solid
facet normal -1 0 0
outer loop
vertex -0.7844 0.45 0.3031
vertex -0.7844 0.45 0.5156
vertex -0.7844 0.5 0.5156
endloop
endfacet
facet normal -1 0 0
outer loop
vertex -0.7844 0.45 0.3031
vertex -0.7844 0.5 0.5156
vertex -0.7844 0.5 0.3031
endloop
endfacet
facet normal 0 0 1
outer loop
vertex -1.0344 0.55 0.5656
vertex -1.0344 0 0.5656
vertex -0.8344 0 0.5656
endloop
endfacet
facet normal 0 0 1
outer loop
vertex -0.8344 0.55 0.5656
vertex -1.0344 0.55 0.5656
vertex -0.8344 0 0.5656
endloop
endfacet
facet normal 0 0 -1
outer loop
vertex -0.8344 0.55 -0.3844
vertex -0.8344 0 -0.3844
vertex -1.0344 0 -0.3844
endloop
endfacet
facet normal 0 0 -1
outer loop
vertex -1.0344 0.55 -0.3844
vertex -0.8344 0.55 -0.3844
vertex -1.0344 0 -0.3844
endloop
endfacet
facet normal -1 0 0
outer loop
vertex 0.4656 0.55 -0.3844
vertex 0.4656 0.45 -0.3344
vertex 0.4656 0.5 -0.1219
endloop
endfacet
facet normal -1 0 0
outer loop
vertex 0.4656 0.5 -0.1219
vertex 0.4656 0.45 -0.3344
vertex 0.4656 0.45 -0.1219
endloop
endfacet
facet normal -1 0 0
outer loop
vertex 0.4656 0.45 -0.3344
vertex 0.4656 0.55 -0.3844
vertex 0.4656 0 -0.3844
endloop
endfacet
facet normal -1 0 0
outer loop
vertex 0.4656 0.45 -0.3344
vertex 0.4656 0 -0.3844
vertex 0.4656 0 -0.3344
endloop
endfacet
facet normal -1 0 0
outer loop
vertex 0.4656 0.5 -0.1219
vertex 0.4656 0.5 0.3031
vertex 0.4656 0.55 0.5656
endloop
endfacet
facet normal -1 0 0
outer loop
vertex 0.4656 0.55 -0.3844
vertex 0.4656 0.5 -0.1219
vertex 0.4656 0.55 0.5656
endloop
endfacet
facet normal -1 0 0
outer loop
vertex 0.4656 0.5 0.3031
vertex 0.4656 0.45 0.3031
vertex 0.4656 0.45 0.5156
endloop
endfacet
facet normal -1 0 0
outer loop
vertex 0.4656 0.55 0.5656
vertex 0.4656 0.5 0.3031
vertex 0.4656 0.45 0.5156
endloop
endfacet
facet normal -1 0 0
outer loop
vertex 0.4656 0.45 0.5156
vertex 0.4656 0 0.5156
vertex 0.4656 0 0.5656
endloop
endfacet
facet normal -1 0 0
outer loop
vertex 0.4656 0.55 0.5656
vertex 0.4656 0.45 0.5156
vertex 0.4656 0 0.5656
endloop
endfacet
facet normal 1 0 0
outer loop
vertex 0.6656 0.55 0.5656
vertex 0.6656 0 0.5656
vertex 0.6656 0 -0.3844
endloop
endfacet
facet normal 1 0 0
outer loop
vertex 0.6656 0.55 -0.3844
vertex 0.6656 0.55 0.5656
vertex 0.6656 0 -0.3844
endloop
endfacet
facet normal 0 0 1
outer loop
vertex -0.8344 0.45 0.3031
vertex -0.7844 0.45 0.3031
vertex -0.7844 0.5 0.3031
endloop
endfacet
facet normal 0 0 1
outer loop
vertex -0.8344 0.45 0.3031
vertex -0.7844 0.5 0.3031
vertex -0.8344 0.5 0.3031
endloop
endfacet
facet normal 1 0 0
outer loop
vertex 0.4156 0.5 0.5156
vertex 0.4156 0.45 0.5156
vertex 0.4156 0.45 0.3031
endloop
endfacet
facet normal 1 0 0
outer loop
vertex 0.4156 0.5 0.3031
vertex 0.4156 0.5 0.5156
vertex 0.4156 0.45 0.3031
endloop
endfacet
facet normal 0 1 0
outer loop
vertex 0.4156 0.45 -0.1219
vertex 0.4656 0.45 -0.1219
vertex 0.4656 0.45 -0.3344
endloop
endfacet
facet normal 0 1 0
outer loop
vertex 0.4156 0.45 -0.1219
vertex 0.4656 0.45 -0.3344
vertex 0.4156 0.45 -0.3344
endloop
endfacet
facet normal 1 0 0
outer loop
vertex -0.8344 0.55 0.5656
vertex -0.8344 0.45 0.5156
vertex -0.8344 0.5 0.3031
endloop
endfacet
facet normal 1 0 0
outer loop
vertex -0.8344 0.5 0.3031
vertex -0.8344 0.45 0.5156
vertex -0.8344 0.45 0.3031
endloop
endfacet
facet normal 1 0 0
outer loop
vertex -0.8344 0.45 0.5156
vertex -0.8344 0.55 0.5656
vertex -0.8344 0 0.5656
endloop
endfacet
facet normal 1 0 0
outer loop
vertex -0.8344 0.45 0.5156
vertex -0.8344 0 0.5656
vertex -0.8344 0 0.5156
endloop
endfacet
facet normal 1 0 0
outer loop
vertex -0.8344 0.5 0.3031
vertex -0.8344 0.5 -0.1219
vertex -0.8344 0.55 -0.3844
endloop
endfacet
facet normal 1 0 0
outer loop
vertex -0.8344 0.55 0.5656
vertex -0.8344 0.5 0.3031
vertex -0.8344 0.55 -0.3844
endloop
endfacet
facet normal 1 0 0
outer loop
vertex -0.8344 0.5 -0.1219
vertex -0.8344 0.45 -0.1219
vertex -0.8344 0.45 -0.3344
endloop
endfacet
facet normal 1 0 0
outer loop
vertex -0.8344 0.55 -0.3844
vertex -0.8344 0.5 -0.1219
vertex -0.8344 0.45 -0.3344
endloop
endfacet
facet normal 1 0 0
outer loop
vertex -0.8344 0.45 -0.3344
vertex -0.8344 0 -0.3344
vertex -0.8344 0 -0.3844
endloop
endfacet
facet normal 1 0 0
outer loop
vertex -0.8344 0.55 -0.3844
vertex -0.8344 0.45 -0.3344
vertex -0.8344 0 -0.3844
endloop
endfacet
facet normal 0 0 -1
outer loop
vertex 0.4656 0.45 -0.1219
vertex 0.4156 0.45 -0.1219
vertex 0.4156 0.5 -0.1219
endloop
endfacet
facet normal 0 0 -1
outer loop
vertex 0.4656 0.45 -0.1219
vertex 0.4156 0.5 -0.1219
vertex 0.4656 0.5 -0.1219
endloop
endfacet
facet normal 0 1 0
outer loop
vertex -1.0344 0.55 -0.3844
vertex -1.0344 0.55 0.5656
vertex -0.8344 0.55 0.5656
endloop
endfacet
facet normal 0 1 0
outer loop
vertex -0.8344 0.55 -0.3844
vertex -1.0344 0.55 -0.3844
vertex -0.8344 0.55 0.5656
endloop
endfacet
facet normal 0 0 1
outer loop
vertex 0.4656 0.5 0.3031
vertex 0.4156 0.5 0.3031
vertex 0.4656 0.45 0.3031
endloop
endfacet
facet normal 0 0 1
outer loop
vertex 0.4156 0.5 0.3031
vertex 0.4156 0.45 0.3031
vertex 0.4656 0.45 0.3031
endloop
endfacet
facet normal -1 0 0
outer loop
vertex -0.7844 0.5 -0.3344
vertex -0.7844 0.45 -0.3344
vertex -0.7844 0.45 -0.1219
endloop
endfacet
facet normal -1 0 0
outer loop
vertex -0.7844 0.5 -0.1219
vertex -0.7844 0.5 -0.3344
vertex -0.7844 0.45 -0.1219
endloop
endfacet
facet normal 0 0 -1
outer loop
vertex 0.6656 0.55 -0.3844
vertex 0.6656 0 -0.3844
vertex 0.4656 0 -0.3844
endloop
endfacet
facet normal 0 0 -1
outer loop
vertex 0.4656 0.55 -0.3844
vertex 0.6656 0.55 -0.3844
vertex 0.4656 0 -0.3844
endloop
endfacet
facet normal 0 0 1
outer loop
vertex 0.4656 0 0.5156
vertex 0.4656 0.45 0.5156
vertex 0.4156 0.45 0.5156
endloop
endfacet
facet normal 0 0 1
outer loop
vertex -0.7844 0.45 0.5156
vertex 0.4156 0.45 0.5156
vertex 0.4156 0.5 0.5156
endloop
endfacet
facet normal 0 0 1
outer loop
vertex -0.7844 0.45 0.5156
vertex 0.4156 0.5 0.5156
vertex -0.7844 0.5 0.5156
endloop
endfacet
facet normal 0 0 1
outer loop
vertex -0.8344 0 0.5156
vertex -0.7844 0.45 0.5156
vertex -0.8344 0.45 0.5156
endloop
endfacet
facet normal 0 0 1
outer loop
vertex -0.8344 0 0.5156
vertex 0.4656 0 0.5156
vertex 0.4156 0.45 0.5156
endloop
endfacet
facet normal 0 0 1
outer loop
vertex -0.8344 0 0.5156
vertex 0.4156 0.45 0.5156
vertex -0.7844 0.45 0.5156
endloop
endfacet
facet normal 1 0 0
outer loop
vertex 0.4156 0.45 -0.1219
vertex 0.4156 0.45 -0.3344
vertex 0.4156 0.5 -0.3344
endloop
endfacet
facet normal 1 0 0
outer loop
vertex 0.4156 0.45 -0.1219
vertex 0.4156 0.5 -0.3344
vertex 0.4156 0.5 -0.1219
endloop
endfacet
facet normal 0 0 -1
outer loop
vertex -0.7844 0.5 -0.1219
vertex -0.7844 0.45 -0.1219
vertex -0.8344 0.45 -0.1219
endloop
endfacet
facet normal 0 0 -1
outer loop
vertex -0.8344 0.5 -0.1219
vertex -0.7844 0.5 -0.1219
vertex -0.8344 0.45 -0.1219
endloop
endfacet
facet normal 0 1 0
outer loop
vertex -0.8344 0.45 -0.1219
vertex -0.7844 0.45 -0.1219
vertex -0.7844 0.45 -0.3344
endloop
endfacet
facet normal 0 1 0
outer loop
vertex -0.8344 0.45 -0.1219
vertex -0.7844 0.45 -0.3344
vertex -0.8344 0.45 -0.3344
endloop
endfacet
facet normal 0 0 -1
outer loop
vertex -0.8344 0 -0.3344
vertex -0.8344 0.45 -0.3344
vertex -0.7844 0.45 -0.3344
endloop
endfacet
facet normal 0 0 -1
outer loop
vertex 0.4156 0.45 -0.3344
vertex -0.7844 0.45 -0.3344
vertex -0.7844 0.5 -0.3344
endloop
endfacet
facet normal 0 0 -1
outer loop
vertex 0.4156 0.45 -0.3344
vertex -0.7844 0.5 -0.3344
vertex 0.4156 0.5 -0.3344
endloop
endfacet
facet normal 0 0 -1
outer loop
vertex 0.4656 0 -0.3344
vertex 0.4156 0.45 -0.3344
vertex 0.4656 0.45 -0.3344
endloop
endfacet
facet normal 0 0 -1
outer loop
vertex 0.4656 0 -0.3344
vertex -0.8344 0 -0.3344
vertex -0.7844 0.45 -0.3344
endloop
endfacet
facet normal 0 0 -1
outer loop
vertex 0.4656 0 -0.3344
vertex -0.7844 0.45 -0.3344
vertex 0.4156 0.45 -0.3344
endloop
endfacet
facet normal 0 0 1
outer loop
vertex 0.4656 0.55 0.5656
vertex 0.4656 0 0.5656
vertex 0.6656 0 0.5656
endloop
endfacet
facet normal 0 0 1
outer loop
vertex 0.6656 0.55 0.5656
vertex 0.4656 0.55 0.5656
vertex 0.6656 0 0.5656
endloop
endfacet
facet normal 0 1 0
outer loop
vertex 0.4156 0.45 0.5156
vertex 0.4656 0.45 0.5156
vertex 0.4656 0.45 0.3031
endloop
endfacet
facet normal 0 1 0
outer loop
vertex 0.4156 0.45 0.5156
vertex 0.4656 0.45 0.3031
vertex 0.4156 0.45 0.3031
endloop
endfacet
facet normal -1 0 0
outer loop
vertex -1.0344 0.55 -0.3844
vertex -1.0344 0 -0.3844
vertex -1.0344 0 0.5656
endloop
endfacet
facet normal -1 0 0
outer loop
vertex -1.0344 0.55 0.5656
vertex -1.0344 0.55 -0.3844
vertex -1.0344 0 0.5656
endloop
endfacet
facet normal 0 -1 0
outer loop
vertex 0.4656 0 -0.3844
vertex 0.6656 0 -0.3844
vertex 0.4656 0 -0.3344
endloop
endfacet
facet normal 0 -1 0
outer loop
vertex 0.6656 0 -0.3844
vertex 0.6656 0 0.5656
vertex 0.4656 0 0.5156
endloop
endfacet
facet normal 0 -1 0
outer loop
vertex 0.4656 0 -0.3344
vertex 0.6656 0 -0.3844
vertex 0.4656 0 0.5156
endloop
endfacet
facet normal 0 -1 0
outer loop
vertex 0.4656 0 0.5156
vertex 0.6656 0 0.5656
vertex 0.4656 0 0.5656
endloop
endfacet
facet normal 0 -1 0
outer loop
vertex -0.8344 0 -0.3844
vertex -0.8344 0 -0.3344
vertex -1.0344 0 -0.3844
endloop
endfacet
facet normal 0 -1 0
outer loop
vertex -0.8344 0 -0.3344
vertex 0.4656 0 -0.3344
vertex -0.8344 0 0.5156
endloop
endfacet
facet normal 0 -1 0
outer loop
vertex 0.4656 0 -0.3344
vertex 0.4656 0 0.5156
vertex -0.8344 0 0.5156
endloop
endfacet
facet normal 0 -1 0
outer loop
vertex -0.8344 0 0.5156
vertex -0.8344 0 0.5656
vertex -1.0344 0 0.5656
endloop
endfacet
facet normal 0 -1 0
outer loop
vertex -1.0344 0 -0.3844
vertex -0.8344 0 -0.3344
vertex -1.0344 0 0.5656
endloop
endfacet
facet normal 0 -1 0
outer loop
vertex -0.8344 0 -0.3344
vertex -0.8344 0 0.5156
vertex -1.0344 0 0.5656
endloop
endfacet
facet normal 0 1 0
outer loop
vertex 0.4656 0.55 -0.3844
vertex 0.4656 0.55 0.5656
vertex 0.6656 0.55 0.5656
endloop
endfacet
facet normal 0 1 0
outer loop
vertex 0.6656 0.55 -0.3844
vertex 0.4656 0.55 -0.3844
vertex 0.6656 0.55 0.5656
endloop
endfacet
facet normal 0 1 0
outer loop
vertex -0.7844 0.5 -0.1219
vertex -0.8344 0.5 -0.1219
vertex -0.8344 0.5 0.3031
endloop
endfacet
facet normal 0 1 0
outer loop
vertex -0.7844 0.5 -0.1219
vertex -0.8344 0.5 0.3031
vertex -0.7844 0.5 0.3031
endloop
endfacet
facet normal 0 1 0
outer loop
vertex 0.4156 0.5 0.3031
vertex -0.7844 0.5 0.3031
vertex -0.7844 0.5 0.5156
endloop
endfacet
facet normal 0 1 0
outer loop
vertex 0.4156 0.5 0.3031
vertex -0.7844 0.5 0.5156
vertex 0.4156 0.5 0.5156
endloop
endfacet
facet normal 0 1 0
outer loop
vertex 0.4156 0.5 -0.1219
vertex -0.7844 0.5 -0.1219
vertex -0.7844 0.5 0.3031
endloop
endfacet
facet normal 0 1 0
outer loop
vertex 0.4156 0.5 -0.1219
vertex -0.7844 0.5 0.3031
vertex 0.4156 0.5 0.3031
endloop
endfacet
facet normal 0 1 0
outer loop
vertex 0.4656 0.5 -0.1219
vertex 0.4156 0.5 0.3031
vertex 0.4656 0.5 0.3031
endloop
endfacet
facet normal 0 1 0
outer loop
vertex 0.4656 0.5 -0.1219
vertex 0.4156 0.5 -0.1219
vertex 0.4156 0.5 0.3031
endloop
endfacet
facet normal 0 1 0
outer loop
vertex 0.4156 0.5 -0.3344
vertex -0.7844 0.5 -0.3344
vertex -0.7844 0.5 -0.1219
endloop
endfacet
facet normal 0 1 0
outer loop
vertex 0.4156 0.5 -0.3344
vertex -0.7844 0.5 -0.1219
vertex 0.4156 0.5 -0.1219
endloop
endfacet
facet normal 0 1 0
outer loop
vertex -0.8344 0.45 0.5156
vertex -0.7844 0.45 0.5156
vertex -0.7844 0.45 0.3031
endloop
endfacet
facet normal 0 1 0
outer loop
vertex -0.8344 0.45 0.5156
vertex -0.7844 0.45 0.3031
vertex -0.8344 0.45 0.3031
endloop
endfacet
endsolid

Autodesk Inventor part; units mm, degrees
ref_plane "YZ Plane" through (0, 0, 0) normal (1, 0, 0) x (0, 1, 0)
ref_plane "XZ Plane" through (0, 0, 0) normal (0, 1, 0) x (-1, 0, 0)
ref_plane "XY Plane" through (0, 0, 0) normal (0, 0, 1) x (1, 0, 0)
sketch "Sketch1" plane through (0, 0, 0) normal (0, 1, 0) x (-1, 0, 0)
  line L0 (-0.6156, 0.5156) -> (0.9844, 0.5156)
  line L1 (0.9844, 0.5156) -> (0.9844, -0.3344)
  line L2 (0.9844, -0.3344) -> (-0.6156, -0.3344)
  line L3 (-0.6156, -0.3344) -> (-0.6156, 0.5156)
  point P0 (0, 0)
  dimension "d0" = 1.6
  dimension "d1" = 0.85
extrude "Extrusion1" add sketch "Sketch1" along normal blind 0.45
sketch "Sketch2" plane through (0, 0, 0) normal (0, -1, 0) x (1, 0, 0)
  line L0 (-0.9844, -0.3344) -> (0.6156, -0.3344) projected
  line L1 (0.6156, -0.3344) -> (0.6156, 0.5156) projected
  line L2 (-1.0344, 0.5656) -> (-0.8344, 0.5656)
  line L3 (-0.8344, 0.5656) -> (-0.8344, -0.3844)
  line L4 (-0.8344, -0.3844) -> (-1.0344, -0.3844)
  line L5 (-1.0344, -0.3844) -> (-1.0344, 0.5656)
  line L6 (0.4656, 0.5656) -> (0.6656, 0.5656)
  line L7 (0.6656, 0.5656) -> (0.6656, -0.3844)
  line L8 (0.6656, -0.3844) -> (0.4656, -0.3844)
  line L9 (0.4656, -0.3844) -> (0.4656, 0.5656)
  point P0 (0, 0)
  dimension "d4" = 0.2
  dimension "d5" = 0.2
  dimension "d6" = 1.7
  dimension "d8" = 0.05
  dimension "d9" = 0.95
  dimension "d10" = 0.95
  dimension "d11" = 0.05
  dimension "d12" = 0.05
extrude "Extrusion2" add sketch "Sketch2" against normal blind 0.55
sketch "Sketch3" plane through (0, 0.45, 0) normal (0, 1, 0) x (1, 0, 0)
  line L0 (0.4656, -0.5156) -> (0.4656, 0.3344) projected
  line L1 (0.4656, 0.3344) -> (-0.8344, 0.3344) projected
  line L2 (-0.8344, 0.3344) -> (0.4656, 0.3344)
  line L3 (0.4656, 0.3344) -> (0.4656, -0.5156)
  line L4 (0.4656, -0.5156) -> (-0.8344, -0.5156)
  line L5 (-0.8344, -0.5156) -> (-0.8344, 0.3344)
  line L6 (-0.8344, 0.3344) -> (-0.7844, 0.3344)
  line L7 (-0.7844, 0.3344) -> (-0.7844, 0.1219)
  line L8 (-0.7844, 0.1219) -> (-0.8344, 0.1219)
  line L9 (-0.8344, 0.1219) -> (-0.8344, 0.3344)
  line L10 (-0.8344, -0.5156) -> (-0.7844, -0.5156)
  line L11 (-0.7844, -0.5156) -> (-0.7844, -0.3031)
  line L12 (-0.7844, -0.3031) -> (-0.8344, -0.3031)
  line L13 (-0.8344, -0.3031) -> (-0.8344, -0.5156)
  line L14 (0.4656, 0.3344) -> (0.4156, 0.3344)
  line L15 (0.4156, 0.3344) -> (0.4156, 0.1219)
  line L16 (0.4156, 0.1219) -> (0.4656, 0.1219)
  line L17 (0.4656, 0.1219) -> (0.4656, 0.3344)
  line L18 (0.4656, -0.5156) -> (0.4156, -0.5156)
  line L19 (0.4156, -0.5156) -> (0.4156, -0.3031)
  line L20 (0.4156, -0.3031) -> (0.4656, -0.3031)
  line L21 (0.4656, -0.3031) -> (0.4656, -0.5156)
  point P0 (0, 0)
  dimension "d15" = 0.05
  dimension "d16" = 0.05
  dimension "d17" = 0.05
  dimension "d18" = 0.05
  dimension "d19" = 0.2125
  dimension "d20" = 0.2125
  dimension "d21" = 0.2125
  dimension "d22" = 0.2125
extrude "Extrusion3" add sketch "Sketch3" along normal blind 0.05 contours L20 L19 L4 L11 L12 L5 L8 L7 L1 L15 L16 L0
properties part number "0603Resistor"
